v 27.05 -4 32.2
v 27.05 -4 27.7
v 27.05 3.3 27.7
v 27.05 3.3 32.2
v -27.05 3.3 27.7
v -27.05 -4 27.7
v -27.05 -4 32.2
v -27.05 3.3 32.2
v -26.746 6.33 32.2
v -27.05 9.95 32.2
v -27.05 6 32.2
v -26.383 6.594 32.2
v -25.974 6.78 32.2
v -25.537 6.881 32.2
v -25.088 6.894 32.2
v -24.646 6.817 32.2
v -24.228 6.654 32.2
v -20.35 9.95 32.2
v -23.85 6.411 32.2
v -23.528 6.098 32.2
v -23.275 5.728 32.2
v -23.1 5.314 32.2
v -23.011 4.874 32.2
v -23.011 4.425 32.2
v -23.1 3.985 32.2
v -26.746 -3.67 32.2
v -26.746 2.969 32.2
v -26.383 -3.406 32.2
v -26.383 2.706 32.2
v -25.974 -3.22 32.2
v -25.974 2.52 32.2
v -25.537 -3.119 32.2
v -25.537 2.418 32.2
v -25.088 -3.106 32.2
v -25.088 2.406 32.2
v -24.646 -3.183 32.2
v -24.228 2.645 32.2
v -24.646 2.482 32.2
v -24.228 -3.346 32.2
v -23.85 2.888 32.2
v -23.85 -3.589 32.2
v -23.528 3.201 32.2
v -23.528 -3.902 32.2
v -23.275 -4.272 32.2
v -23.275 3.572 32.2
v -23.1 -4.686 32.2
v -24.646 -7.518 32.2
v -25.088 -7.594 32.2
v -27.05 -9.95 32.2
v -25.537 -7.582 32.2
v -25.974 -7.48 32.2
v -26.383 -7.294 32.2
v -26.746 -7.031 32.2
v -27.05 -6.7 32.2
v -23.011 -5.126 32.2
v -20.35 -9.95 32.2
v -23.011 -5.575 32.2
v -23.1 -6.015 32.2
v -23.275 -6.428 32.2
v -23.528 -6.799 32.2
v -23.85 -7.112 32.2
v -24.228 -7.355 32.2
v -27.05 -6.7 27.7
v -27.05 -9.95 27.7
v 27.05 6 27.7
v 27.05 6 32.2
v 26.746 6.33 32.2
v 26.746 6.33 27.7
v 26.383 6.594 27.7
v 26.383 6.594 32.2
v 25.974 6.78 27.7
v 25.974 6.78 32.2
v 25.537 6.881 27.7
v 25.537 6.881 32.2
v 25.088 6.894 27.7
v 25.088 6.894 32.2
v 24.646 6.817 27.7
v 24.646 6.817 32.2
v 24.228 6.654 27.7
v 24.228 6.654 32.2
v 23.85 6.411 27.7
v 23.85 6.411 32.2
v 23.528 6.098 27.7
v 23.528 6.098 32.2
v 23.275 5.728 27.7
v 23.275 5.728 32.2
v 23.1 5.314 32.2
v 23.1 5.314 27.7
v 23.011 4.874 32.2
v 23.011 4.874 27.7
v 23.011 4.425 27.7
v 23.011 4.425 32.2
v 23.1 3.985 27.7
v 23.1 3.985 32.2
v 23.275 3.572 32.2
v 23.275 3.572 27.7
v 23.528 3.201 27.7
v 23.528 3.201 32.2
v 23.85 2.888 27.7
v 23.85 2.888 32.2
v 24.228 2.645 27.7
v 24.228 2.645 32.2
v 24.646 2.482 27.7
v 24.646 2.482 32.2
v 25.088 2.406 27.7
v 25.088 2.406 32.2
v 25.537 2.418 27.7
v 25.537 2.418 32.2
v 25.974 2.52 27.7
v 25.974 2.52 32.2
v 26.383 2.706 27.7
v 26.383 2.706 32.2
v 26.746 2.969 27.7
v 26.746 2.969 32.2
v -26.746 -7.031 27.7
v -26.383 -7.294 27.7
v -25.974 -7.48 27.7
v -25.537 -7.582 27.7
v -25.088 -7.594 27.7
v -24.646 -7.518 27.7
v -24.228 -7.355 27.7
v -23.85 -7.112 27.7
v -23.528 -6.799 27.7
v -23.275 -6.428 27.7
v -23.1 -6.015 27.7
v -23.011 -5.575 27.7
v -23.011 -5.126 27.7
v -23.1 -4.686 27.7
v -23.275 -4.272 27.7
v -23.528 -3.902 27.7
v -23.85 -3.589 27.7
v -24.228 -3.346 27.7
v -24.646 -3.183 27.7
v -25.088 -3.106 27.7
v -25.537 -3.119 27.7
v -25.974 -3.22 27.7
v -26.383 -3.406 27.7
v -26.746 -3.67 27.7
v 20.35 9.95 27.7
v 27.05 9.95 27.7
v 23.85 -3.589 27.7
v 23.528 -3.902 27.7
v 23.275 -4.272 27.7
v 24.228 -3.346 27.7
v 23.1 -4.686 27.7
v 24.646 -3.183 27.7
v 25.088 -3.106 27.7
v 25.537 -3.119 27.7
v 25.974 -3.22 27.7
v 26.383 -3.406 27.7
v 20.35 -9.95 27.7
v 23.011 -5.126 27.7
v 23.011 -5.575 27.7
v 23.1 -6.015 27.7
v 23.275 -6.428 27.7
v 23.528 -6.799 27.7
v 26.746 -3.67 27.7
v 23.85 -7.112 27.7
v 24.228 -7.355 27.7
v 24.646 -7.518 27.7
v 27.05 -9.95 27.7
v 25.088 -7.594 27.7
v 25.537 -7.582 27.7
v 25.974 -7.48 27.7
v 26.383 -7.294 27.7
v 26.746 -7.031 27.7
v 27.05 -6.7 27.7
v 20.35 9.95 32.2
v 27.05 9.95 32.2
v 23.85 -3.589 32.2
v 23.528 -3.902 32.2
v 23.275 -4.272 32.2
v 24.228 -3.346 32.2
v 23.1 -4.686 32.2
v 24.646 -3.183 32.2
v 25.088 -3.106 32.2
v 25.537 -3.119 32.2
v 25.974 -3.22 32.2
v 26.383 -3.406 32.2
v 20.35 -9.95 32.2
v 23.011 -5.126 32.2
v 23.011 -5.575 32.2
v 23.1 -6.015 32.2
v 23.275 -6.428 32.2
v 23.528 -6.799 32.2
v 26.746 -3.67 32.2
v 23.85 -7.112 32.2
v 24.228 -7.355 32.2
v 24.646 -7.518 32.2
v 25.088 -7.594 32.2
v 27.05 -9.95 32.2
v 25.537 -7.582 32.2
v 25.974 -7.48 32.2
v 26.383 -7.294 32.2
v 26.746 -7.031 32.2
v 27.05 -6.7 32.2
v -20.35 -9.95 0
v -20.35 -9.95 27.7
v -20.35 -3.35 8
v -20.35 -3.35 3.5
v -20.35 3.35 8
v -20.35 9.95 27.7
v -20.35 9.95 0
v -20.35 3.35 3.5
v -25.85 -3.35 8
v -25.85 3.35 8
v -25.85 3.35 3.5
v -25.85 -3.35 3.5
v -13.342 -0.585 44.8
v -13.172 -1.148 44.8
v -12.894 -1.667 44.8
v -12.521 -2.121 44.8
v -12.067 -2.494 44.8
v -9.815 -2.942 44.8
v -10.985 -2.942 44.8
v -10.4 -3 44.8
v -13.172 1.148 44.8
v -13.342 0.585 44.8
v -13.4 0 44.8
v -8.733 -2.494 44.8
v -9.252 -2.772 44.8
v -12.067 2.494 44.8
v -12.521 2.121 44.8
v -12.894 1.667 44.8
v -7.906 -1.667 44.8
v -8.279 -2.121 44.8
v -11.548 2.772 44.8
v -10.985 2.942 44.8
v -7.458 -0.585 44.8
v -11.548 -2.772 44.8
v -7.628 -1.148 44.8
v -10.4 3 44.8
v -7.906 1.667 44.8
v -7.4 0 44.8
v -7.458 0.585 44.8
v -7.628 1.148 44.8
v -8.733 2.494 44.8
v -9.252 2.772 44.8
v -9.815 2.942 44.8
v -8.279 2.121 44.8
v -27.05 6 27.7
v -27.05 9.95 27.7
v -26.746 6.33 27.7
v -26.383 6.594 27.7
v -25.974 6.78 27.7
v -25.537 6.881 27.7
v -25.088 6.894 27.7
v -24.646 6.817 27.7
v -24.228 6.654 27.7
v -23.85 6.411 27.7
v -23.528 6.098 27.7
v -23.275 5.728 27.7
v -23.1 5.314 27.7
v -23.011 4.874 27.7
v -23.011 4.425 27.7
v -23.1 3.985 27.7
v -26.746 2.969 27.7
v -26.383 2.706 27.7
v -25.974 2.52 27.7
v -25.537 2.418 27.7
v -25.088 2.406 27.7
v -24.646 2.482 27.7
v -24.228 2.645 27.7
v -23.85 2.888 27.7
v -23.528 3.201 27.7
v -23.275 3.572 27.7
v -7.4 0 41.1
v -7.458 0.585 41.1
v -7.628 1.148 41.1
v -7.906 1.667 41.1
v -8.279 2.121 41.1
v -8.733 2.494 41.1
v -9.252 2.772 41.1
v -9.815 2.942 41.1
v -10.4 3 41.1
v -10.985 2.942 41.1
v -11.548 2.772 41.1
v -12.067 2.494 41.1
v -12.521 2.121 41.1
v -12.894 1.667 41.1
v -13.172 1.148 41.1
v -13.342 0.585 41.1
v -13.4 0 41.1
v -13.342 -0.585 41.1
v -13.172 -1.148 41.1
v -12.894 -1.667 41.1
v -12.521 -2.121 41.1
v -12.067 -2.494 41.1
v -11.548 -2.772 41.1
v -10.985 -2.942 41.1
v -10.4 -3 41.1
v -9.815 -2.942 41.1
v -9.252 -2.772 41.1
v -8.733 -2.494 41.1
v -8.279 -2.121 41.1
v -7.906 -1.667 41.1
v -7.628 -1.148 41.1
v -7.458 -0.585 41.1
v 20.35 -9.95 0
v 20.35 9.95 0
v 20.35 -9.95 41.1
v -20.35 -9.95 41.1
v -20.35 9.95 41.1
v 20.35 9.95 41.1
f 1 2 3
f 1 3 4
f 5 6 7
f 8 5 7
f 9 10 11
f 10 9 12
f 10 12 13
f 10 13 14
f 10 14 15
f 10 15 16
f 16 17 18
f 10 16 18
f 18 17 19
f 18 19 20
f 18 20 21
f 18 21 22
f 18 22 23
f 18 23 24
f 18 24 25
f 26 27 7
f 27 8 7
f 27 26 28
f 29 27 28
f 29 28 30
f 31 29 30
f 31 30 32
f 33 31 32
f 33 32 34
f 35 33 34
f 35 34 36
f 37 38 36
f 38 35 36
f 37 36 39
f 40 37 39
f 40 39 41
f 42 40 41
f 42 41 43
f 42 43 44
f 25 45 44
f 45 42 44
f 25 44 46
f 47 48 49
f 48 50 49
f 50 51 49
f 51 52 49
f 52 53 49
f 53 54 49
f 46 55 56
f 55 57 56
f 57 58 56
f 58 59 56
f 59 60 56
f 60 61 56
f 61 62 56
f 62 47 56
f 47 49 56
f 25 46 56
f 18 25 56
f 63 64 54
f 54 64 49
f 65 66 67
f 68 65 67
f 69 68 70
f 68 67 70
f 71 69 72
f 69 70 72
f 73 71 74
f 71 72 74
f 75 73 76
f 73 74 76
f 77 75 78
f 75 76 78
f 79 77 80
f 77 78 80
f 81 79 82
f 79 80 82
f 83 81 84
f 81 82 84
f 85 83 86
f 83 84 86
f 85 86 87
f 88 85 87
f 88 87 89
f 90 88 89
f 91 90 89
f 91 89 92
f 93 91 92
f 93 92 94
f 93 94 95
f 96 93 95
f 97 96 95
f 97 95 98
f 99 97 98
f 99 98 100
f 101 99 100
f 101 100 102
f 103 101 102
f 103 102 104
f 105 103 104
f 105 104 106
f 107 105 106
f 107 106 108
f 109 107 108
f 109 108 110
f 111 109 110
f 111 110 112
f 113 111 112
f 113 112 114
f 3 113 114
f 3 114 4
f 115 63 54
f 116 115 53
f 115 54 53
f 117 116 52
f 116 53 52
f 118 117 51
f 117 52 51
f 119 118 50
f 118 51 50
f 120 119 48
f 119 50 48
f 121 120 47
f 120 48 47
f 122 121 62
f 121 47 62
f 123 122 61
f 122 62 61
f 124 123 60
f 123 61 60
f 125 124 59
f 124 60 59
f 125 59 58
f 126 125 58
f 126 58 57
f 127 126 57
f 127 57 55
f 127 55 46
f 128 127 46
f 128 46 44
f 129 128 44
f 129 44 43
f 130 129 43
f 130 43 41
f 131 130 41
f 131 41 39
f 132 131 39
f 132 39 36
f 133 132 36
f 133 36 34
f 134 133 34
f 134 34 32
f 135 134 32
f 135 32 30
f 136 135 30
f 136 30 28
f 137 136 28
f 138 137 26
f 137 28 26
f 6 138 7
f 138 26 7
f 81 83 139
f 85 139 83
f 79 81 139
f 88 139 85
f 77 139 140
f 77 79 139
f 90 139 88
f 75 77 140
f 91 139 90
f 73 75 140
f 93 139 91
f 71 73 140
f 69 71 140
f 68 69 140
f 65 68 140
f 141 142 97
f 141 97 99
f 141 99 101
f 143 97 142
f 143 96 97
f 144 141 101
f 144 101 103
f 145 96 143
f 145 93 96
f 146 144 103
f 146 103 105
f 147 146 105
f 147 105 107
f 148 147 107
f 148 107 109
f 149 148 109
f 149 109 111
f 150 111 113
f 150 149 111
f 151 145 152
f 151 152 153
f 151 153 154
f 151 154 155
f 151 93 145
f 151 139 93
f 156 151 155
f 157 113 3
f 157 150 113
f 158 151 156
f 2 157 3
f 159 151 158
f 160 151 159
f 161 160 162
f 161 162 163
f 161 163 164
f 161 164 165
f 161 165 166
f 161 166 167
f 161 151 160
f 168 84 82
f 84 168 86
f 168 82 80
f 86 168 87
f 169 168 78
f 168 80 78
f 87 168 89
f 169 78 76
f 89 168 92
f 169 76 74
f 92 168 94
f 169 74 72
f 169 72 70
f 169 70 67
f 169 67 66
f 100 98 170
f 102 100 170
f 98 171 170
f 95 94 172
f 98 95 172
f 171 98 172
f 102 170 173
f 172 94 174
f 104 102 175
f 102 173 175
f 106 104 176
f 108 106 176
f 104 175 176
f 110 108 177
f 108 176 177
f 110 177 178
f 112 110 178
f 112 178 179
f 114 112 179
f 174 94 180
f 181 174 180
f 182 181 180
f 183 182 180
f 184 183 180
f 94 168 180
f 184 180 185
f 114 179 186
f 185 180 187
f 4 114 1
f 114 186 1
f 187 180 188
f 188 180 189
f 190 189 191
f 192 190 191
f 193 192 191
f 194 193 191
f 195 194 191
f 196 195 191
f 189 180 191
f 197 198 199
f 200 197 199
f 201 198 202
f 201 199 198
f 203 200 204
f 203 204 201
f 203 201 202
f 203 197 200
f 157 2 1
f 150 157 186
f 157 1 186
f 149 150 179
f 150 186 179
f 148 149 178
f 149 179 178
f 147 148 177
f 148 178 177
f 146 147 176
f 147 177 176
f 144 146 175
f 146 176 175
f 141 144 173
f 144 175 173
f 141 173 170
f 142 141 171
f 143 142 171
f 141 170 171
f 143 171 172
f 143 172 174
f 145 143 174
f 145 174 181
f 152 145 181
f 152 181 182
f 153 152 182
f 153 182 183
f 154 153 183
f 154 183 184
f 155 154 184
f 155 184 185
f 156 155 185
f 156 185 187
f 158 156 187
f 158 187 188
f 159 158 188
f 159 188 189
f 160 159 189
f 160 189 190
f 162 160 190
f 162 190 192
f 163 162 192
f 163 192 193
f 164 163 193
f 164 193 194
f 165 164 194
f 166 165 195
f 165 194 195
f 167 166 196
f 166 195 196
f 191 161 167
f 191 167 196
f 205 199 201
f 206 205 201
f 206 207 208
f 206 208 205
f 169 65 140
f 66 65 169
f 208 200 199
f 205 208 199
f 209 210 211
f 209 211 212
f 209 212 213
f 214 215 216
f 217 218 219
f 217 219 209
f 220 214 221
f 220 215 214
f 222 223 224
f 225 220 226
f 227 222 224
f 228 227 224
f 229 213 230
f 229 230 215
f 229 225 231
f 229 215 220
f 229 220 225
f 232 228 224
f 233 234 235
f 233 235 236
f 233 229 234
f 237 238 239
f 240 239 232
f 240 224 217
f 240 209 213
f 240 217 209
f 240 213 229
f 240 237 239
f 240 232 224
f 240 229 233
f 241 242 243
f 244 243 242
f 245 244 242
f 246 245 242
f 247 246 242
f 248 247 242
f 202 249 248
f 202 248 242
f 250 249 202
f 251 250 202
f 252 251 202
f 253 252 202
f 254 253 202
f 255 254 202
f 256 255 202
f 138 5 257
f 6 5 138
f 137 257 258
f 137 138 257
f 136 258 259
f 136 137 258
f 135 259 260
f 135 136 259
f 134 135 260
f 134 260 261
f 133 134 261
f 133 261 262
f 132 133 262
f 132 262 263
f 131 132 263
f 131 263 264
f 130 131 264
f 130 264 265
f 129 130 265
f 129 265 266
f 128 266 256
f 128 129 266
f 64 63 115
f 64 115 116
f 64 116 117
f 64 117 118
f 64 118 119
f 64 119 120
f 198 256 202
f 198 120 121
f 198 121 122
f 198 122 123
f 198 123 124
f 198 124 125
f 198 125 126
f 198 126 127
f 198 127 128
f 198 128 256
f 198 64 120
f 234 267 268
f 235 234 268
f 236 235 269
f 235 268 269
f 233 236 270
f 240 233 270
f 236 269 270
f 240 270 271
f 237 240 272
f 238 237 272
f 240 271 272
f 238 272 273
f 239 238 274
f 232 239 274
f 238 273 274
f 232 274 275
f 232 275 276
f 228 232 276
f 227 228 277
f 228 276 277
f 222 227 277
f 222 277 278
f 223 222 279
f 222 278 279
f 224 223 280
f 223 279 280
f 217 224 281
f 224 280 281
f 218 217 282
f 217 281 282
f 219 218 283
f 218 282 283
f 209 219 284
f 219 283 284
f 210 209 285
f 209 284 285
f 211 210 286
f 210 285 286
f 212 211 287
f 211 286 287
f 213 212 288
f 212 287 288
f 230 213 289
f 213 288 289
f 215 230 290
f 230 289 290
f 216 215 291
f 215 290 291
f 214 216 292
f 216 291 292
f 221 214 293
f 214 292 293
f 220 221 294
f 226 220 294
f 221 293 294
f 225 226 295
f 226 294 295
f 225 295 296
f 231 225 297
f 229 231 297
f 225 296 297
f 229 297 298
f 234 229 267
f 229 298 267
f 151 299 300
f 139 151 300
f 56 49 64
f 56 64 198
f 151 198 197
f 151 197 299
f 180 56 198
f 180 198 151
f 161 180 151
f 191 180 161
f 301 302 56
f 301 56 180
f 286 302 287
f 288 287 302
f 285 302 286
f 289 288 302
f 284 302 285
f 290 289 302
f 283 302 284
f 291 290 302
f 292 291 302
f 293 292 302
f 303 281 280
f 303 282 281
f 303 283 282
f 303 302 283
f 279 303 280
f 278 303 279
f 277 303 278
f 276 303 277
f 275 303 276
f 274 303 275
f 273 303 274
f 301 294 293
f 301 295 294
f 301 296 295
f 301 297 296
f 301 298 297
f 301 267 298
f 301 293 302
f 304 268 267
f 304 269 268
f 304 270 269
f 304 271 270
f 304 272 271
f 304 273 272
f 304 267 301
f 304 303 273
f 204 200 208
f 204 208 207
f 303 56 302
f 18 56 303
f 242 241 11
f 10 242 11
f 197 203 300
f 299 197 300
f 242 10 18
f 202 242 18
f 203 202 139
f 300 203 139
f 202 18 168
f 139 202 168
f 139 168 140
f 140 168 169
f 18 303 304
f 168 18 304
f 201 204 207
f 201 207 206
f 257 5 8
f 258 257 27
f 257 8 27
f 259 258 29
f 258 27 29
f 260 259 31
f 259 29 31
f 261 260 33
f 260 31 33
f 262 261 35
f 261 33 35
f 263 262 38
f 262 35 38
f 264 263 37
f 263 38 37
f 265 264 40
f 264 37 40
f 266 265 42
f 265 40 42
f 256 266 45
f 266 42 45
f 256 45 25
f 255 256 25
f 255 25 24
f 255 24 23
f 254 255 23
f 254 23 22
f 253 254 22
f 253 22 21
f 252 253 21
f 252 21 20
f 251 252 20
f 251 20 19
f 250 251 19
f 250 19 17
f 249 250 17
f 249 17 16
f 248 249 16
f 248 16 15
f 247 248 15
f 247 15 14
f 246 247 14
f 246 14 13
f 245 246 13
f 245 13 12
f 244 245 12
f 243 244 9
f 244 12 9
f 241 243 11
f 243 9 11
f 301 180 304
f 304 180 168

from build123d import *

# Parameters (mm, degrees)
SKETCH1_W           = 40.7
SKETCH1_H           = 19.9
BOSS_EXTRUDE1_DEPTH = 41.1
SKETCH2_W           = 54.1
SKETCH2_H           = 4.5
BOSS_EXTRUDE2_DEPTH = 19.9
CUT_EXTRUDE1_REACH  = 34.2
SKETCH3_R           = 2.25
SKETCH4_R           = 3
BOSS_EXTRUDE3_DEPTH = 3.7
SKETCH6_W           = 4.5
SKETCH6_H           = 6.7
BOSS_EXTRUDE4_DEPTH = 5.5


with BuildPart() as part:
    # Sketch1 → Boss-Extrude1 (new body)
    with BuildSketch(Plane.XY):
        Rectangle(SKETCH1_W, SKETCH1_H)
    extrude(amount=BOSS_EXTRUDE1_DEPTH)

    # Sketch2 → Boss-Extrude2 (add)
    with BuildSketch(Plane.XZ.offset(9.95)):
        with Locations((0, 29.95)):
            Rectangle(SKETCH2_W, SKETCH2_H)
    extrude(amount=-BOSS_EXTRUDE2_DEPTH)

    # Sketch3 → Cut-Extrude1 (cut, up to next)
    with BuildSketch(Plane.XY.offset(32.2), mode=Mode.PRIVATE) as cut_extrude1_sk1:
        with Locations((-25.25, 4.649810013)):
            Circle(SKETCH3_R)
    cut_extrude1_tool1 = extrude(cut_extrude1_sk1.sketch, amount=-CUT_EXTRUDE1_REACH, mode=Mode.PRIVATE) & part.part
    add(cut_extrude1_tool1.solids().sort_by_distance((-25.25, 4.64981, 32.2))[0], mode=Mode.SUBTRACT)
    # Sketch3 → Cut-Extrude1 (cut, up to next)
    with BuildSketch(Plane.XY.offset(32.2), mode=Mode.PRIVATE) as cut_extrude1_sk2:
        with Locations((-25.25, -5.350189987)):
            Circle(SKETCH3_R)
    cut_extrude1_tool2 = extrude(cut_extrude1_sk2.sketch, amount=-CUT_EXTRUDE1_REACH, mode=Mode.PRIVATE) & part.part
    add(cut_extrude1_tool2.solids().sort_by_distance((-25.25, -5.35019, 32.2))[0], mode=Mode.SUBTRACT)
    # Sketch3 → Cut-Extrude1 (cut, up to next)
    with BuildSketch(Plane.XY.offset(32.2), mode=Mode.PRIVATE) as cut_extrude1_sk3:
        with Locations((25.25, 4.649810013)):
            Circle(SKETCH3_R)
    cut_extrude1_tool3 = extrude(cut_extrude1_sk3.sketch, amount=-CUT_EXTRUDE1_REACH, mode=Mode.PRIVATE) & part.part
    add(cut_extrude1_tool3.solids().sort_by_distance((25.25, 4.64981, 32.2))[0], mode=Mode.SUBTRACT)
    # Sketch3 → Cut-Extrude1 (cut, up to next)
    with BuildSketch(Plane.XY.offset(32.2), mode=Mode.PRIVATE) as cut_extrude1_sk4:
        with Locations((25.25, -5.350189987)):
            Circle(SKETCH3_R)
    cut_extrude1_tool4 = extrude(cut_extrude1_sk4.sketch, amount=-CUT_EXTRUDE1_REACH, mode=Mode.PRIVATE) & part.part
    add(cut_extrude1_tool4.solids().sort_by_distance((25.25, -5.35019, 32.2))[0], mode=Mode.SUBTRACT)

    # Sketch4 → Boss-Extrude3 (add)
    with BuildSketch(Plane.XY.offset(41.1)):
        with Locations((-10.4, 0)):
            Circle(SKETCH4_R)
    extrude(amount=BOSS_EXTRUDE3_DEPTH)

    # Sketch6 → Boss-Extrude4 (add)
    with BuildSketch(Plane.ZY.offset(20.35)):
        with Locations((5.75, 0)):
            Rectangle(SKETCH6_W, SKETCH6_H)
    extrude(amount=BOSS_EXTRUDE4_DEPTH)


solid = part.part
